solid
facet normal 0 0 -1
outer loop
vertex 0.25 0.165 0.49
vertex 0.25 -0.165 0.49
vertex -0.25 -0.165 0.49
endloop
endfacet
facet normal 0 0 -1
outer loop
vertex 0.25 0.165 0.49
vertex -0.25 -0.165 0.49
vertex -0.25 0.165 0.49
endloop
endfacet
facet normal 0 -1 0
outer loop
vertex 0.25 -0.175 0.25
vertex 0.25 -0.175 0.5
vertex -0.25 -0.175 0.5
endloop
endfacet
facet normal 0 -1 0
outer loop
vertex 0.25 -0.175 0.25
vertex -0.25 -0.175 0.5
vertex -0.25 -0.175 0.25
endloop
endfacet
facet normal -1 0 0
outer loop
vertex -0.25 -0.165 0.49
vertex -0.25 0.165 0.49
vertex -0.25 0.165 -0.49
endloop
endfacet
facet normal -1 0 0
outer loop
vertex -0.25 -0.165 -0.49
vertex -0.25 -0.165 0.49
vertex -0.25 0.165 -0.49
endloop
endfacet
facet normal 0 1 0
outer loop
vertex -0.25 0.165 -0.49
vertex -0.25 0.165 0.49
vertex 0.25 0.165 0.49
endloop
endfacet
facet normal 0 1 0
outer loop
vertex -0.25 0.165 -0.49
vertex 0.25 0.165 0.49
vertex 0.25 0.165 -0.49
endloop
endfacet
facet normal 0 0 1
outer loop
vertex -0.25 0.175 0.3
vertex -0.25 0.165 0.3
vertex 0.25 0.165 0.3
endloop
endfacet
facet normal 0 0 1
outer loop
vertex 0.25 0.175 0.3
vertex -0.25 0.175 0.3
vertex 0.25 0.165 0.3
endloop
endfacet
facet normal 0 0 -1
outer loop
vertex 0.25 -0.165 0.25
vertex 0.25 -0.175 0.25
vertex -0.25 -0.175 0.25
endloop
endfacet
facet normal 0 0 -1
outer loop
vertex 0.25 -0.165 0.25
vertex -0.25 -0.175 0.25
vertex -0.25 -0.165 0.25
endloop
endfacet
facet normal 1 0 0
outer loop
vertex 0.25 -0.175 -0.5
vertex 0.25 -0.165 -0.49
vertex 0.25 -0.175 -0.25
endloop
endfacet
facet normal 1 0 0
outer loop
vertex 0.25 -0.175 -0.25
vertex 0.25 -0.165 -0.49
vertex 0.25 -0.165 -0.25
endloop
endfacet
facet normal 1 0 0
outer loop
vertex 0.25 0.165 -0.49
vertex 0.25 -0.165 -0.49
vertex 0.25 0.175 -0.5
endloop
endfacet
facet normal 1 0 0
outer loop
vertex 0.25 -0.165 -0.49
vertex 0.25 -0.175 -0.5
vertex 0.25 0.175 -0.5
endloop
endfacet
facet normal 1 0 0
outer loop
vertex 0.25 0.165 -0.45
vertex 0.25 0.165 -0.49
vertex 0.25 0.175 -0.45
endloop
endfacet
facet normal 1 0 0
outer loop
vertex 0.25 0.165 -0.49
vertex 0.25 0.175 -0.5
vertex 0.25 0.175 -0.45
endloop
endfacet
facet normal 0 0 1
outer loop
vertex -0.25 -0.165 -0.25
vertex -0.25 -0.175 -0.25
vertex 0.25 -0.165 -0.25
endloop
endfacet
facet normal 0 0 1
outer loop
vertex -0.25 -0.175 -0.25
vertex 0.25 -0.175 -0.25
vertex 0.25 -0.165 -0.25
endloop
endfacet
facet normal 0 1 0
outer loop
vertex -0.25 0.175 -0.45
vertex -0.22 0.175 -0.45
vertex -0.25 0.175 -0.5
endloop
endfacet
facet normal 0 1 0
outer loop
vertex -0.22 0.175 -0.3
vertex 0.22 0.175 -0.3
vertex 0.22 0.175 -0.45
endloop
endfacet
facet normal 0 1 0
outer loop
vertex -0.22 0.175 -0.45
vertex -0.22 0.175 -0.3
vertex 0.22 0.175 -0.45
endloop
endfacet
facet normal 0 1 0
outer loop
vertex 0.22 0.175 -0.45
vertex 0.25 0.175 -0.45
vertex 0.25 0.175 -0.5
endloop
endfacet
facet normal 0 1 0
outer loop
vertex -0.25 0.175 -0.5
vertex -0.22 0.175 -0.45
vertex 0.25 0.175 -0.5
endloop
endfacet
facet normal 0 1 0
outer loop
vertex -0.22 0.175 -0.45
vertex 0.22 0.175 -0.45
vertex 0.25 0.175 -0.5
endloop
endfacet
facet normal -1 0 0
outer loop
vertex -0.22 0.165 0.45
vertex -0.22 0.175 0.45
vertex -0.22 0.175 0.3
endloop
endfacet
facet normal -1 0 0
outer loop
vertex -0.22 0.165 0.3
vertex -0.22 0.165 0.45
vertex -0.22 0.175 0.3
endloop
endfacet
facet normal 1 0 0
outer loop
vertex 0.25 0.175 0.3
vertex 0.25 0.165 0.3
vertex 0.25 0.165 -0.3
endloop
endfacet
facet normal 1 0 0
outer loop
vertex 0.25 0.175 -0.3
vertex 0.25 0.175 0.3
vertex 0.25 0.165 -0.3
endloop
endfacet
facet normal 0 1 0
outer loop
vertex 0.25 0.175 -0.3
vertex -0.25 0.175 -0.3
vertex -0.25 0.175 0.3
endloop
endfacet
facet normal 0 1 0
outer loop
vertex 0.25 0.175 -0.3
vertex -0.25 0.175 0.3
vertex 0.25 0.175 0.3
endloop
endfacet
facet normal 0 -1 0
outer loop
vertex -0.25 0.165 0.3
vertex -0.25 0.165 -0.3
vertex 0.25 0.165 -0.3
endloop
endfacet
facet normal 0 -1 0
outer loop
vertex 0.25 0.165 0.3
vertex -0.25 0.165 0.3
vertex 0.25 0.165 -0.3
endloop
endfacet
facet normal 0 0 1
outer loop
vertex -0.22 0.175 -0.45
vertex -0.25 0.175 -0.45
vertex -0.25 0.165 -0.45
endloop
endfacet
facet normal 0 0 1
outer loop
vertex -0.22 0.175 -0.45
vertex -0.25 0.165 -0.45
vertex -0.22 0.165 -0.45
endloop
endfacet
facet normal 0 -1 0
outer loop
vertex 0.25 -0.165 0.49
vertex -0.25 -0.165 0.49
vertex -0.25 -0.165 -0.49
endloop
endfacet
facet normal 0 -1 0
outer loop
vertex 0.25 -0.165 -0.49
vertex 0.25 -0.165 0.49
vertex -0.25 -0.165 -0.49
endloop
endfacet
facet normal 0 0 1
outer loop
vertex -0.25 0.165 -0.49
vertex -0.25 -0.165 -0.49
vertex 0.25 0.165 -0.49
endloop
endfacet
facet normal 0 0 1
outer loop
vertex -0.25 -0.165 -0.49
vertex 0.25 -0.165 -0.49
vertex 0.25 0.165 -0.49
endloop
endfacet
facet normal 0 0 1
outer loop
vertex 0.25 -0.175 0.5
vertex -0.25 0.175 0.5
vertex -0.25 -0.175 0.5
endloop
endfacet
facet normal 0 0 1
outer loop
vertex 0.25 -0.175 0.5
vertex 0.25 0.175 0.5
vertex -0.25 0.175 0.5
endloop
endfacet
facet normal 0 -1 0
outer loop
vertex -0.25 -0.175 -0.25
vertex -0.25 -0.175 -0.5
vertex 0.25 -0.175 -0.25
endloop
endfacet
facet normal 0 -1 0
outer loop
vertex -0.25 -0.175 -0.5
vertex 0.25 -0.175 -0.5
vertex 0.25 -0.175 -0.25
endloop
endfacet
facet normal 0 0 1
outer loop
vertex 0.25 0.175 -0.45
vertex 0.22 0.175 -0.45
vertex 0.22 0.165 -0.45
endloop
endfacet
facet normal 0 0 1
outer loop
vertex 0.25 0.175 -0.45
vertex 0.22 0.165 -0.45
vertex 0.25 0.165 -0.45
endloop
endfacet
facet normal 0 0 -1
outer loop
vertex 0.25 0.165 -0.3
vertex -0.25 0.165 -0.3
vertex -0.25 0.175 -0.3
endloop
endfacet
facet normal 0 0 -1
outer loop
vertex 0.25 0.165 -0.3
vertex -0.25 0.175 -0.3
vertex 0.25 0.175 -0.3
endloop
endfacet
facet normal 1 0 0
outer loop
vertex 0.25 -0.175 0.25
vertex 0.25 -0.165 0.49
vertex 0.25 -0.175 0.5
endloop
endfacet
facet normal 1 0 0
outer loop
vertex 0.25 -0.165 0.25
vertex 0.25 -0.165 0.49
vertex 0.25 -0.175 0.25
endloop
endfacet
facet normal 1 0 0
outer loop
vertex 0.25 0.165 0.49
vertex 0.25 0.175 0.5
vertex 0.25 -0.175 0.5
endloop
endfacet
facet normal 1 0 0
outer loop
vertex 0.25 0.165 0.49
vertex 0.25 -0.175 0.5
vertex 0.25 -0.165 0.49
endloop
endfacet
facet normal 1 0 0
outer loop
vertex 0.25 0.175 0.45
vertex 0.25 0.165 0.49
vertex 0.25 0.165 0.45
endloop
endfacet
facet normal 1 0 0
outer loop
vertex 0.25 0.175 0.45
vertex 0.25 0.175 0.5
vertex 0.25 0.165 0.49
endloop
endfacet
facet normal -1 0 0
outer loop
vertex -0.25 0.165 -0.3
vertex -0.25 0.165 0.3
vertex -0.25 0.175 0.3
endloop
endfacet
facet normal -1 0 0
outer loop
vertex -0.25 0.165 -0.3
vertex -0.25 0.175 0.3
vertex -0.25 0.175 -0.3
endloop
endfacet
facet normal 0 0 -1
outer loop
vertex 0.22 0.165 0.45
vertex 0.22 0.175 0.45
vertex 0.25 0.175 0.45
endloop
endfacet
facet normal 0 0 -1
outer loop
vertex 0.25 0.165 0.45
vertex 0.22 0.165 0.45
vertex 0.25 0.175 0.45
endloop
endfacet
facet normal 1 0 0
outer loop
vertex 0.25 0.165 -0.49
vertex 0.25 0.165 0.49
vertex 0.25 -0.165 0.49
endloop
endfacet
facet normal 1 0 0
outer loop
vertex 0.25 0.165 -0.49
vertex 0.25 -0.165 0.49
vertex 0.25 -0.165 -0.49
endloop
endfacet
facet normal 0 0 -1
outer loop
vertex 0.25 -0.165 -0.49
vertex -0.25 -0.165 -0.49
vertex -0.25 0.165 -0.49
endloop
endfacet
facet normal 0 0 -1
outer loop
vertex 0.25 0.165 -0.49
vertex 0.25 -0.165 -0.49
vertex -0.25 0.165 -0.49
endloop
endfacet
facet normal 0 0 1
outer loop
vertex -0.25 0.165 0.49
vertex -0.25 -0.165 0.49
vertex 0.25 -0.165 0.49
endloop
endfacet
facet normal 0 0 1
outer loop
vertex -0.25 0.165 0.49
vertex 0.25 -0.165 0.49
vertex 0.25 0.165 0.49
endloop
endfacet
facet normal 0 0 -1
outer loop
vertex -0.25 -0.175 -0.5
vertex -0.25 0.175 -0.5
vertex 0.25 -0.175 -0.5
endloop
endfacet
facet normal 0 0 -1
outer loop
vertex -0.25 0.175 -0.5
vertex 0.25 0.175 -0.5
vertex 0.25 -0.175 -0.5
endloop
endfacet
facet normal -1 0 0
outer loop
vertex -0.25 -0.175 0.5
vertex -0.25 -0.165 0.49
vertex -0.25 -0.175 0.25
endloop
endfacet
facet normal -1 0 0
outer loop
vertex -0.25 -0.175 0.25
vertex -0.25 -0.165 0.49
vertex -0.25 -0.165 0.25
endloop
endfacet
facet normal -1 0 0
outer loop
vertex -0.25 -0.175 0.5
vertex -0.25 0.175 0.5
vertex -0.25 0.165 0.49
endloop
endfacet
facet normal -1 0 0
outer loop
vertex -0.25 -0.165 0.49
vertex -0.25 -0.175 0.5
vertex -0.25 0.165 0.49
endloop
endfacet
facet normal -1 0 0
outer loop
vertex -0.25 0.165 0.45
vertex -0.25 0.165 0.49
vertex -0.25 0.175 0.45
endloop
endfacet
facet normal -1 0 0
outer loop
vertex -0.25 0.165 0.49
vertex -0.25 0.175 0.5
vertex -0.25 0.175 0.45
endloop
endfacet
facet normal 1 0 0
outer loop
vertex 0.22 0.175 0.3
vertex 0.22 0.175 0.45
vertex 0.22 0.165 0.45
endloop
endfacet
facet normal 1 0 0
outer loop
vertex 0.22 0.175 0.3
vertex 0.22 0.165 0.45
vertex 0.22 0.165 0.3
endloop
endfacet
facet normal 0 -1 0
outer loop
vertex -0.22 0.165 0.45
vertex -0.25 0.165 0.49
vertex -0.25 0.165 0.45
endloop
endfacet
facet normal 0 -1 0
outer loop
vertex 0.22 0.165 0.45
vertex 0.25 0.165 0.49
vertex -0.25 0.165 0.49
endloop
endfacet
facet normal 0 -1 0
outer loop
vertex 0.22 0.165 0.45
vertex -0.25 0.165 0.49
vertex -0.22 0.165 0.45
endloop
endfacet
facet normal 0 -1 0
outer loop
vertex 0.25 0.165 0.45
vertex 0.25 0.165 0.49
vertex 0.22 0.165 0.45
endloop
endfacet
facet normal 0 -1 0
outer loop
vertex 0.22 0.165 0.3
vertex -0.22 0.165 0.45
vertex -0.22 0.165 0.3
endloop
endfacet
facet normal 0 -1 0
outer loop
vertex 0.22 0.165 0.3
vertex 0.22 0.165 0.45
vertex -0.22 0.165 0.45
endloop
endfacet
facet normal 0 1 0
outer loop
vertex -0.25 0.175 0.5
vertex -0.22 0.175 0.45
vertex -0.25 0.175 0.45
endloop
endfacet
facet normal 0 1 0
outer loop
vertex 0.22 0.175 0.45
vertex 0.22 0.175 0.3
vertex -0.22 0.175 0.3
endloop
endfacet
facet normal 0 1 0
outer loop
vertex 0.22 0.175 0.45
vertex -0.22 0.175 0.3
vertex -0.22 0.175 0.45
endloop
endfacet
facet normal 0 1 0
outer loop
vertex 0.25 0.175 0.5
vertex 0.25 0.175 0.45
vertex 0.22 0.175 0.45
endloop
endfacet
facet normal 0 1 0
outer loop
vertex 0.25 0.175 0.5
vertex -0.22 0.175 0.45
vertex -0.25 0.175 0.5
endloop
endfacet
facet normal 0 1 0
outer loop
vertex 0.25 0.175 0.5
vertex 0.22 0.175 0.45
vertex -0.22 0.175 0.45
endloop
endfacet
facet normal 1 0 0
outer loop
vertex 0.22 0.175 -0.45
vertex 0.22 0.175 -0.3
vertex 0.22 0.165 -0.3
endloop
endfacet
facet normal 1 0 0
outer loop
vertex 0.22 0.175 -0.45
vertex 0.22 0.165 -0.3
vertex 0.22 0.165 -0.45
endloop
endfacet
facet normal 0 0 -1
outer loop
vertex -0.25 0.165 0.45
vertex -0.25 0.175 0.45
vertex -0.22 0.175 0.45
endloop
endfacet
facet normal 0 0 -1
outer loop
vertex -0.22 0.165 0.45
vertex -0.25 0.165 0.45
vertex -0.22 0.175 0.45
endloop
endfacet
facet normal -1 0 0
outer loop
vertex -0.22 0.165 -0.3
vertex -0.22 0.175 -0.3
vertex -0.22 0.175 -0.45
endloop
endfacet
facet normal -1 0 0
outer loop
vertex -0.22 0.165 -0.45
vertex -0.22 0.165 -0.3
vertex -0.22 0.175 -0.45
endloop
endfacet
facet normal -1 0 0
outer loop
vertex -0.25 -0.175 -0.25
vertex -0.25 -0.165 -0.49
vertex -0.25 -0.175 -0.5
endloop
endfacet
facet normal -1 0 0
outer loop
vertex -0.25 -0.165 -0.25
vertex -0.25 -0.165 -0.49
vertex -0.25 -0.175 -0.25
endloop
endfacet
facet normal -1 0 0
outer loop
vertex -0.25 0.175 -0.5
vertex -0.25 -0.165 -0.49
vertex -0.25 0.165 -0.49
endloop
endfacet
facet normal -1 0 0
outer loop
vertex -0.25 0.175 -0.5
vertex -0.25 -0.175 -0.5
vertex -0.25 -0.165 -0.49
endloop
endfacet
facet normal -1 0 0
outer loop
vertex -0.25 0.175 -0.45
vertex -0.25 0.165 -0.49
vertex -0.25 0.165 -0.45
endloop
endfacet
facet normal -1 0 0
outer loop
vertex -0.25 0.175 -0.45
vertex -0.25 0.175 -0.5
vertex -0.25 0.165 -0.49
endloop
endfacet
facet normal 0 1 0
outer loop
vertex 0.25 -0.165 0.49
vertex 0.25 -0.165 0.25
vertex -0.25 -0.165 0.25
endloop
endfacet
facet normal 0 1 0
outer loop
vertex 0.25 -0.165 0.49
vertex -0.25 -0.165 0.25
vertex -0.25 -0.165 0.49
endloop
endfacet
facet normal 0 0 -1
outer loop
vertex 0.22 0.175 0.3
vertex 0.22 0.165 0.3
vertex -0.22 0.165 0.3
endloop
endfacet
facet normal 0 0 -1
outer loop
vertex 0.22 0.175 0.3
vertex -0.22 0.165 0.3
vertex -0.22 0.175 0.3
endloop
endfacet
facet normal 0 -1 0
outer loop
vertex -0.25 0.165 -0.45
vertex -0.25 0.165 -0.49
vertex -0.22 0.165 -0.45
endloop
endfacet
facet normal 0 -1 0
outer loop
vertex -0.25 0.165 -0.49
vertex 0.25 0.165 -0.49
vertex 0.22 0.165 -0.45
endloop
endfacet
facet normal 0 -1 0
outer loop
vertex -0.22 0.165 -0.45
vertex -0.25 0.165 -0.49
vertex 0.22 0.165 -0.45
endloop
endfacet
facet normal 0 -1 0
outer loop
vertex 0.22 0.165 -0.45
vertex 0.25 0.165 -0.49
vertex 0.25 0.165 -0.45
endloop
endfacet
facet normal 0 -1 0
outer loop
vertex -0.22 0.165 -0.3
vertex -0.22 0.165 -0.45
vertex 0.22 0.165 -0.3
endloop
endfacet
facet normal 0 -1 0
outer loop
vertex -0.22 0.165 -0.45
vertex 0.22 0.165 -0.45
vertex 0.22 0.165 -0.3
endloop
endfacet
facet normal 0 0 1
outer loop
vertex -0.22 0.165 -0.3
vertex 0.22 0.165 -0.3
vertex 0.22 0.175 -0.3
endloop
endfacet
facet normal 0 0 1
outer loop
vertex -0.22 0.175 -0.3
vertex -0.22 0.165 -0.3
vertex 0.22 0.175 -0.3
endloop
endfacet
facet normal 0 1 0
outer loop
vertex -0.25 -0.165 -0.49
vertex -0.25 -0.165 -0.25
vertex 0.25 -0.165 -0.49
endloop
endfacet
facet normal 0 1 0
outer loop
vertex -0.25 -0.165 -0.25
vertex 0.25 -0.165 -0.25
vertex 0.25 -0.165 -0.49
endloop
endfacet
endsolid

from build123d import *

# Parameters (mm, degrees)
BOSS_EXTRUDE2_DEPTH   = 0.25
BOSS_EXTRUDE2_2_DEPTH = 0.25
BOSS_EXTRUDE3_START   = -0.25
SKETCH5_W             = 0.98
SKETCH5_H             = 0.33
BOSS_EXTRUDE3_DEPTH   = 0.5
SKETCH6_W             = 0.03
SKETCH6_H             = 0.15
CUT_EXTRUDE1_DEPTH    = 0.01
SKETCH7_W             = 0.5
SKETCH7_H             = 0.6
BOSS_EXTRUDE4_DEPTH   = 0.01


with BuildPart() as part:
    # Sketch4 → Boss-Extrude2 (new body, symmetric)
    with BuildSketch(Plane(origin=(0, 0, 0), x_dir=(0, 0, -1), z_dir=(1, 0, 0))):
        Polygon((-0.5, 0.175), (-0.5, -0.175), (-0.25, -0.175), (-0.25, -0.165), (-0.49, -0.165), (-0.49, 0.165), (-0.3, 0.165), (-0.3, 0.175), align=None)
    extrude(amount=BOSS_EXTRUDE2_DEPTH, both=True)


with BuildPart() as body_2:
    # Sketch4 → Boss-Extrude2 2 (new body, symmetric)
    with BuildSketch(Plane(origin=(0, 0, 0), x_dir=(0, 0, -1), z_dir=(1, 0, 0))):
        Polygon((0.3, 0.175), (0.5, 0.175), (0.5, -0.175), (0.25, -0.175), (0.25, -0.165), (0.49, -0.165), (0.49, 0.165), (0.3, 0.165), align=None)
    extrude(amount=BOSS_EXTRUDE2_2_DEPTH, both=True)


with BuildPart() as body_3:
    # Sketch5 → Boss-Extrude3 (new body)
    with BuildSketch(Plane(origin=(0, 0, 0), x_dir=(0, 0, -1), z_dir=(1, 0, 0)).offset(BOSS_EXTRUDE3_START)):
        Rectangle(SKETCH5_W, SKETCH5_H)
    extrude(amount=BOSS_EXTRUDE3_DEPTH)


with BuildPart() as cut_extrude1_tool:
    # Sketch6 → Cut-Extrude1 (new body)
    with BuildSketch(Plane(origin=(0, 0.175, 0), x_dir=(1, 0, 0), z_dir=(0, 1, 0))):
        with Locations((-0.235, 0.375)):
            Rectangle(SKETCH6_W, SKETCH6_H)
        with Locations((0.235, 0.375)):
            Rectangle(SKETCH6_W, SKETCH6_H)
        with Locations((0.235, -0.375)):
            Rectangle(SKETCH6_W, SKETCH6_H)
        with Locations((-0.235, -0.375)):
            Rectangle(SKETCH6_W, SKETCH6_H)
    extrude(amount=-CUT_EXTRUDE1_DEPTH)


with BuildPart() as part_1:
    add(part.part)

    # Cut-Extrude1: cut by cut_extrude1_tool
    add(cut_extrude1_tool.part, mode=Mode.SUBTRACT)


with BuildPart() as body_2_1:
    add(body_2.part)

    # Cut-Extrude1: cut by cut_extrude1_tool
    add(cut_extrude1_tool.part, mode=Mode.SUBTRACT)


with BuildPart() as body_4:
    # Sketch7 → Boss-Extrude4 (new body)
    with BuildSketch(Plane(origin=(0, 0.165, 0), x_dir=(1, 0, 0), z_dir=(0, 1, 0))):
        Rectangle(SKETCH7_W, SKETCH7_H)
    extrude(amount=BOSS_EXTRUDE4_DEPTH)


solid = Compound([body_3.part, part_1.part, body_2_1.part, body_4.part])
